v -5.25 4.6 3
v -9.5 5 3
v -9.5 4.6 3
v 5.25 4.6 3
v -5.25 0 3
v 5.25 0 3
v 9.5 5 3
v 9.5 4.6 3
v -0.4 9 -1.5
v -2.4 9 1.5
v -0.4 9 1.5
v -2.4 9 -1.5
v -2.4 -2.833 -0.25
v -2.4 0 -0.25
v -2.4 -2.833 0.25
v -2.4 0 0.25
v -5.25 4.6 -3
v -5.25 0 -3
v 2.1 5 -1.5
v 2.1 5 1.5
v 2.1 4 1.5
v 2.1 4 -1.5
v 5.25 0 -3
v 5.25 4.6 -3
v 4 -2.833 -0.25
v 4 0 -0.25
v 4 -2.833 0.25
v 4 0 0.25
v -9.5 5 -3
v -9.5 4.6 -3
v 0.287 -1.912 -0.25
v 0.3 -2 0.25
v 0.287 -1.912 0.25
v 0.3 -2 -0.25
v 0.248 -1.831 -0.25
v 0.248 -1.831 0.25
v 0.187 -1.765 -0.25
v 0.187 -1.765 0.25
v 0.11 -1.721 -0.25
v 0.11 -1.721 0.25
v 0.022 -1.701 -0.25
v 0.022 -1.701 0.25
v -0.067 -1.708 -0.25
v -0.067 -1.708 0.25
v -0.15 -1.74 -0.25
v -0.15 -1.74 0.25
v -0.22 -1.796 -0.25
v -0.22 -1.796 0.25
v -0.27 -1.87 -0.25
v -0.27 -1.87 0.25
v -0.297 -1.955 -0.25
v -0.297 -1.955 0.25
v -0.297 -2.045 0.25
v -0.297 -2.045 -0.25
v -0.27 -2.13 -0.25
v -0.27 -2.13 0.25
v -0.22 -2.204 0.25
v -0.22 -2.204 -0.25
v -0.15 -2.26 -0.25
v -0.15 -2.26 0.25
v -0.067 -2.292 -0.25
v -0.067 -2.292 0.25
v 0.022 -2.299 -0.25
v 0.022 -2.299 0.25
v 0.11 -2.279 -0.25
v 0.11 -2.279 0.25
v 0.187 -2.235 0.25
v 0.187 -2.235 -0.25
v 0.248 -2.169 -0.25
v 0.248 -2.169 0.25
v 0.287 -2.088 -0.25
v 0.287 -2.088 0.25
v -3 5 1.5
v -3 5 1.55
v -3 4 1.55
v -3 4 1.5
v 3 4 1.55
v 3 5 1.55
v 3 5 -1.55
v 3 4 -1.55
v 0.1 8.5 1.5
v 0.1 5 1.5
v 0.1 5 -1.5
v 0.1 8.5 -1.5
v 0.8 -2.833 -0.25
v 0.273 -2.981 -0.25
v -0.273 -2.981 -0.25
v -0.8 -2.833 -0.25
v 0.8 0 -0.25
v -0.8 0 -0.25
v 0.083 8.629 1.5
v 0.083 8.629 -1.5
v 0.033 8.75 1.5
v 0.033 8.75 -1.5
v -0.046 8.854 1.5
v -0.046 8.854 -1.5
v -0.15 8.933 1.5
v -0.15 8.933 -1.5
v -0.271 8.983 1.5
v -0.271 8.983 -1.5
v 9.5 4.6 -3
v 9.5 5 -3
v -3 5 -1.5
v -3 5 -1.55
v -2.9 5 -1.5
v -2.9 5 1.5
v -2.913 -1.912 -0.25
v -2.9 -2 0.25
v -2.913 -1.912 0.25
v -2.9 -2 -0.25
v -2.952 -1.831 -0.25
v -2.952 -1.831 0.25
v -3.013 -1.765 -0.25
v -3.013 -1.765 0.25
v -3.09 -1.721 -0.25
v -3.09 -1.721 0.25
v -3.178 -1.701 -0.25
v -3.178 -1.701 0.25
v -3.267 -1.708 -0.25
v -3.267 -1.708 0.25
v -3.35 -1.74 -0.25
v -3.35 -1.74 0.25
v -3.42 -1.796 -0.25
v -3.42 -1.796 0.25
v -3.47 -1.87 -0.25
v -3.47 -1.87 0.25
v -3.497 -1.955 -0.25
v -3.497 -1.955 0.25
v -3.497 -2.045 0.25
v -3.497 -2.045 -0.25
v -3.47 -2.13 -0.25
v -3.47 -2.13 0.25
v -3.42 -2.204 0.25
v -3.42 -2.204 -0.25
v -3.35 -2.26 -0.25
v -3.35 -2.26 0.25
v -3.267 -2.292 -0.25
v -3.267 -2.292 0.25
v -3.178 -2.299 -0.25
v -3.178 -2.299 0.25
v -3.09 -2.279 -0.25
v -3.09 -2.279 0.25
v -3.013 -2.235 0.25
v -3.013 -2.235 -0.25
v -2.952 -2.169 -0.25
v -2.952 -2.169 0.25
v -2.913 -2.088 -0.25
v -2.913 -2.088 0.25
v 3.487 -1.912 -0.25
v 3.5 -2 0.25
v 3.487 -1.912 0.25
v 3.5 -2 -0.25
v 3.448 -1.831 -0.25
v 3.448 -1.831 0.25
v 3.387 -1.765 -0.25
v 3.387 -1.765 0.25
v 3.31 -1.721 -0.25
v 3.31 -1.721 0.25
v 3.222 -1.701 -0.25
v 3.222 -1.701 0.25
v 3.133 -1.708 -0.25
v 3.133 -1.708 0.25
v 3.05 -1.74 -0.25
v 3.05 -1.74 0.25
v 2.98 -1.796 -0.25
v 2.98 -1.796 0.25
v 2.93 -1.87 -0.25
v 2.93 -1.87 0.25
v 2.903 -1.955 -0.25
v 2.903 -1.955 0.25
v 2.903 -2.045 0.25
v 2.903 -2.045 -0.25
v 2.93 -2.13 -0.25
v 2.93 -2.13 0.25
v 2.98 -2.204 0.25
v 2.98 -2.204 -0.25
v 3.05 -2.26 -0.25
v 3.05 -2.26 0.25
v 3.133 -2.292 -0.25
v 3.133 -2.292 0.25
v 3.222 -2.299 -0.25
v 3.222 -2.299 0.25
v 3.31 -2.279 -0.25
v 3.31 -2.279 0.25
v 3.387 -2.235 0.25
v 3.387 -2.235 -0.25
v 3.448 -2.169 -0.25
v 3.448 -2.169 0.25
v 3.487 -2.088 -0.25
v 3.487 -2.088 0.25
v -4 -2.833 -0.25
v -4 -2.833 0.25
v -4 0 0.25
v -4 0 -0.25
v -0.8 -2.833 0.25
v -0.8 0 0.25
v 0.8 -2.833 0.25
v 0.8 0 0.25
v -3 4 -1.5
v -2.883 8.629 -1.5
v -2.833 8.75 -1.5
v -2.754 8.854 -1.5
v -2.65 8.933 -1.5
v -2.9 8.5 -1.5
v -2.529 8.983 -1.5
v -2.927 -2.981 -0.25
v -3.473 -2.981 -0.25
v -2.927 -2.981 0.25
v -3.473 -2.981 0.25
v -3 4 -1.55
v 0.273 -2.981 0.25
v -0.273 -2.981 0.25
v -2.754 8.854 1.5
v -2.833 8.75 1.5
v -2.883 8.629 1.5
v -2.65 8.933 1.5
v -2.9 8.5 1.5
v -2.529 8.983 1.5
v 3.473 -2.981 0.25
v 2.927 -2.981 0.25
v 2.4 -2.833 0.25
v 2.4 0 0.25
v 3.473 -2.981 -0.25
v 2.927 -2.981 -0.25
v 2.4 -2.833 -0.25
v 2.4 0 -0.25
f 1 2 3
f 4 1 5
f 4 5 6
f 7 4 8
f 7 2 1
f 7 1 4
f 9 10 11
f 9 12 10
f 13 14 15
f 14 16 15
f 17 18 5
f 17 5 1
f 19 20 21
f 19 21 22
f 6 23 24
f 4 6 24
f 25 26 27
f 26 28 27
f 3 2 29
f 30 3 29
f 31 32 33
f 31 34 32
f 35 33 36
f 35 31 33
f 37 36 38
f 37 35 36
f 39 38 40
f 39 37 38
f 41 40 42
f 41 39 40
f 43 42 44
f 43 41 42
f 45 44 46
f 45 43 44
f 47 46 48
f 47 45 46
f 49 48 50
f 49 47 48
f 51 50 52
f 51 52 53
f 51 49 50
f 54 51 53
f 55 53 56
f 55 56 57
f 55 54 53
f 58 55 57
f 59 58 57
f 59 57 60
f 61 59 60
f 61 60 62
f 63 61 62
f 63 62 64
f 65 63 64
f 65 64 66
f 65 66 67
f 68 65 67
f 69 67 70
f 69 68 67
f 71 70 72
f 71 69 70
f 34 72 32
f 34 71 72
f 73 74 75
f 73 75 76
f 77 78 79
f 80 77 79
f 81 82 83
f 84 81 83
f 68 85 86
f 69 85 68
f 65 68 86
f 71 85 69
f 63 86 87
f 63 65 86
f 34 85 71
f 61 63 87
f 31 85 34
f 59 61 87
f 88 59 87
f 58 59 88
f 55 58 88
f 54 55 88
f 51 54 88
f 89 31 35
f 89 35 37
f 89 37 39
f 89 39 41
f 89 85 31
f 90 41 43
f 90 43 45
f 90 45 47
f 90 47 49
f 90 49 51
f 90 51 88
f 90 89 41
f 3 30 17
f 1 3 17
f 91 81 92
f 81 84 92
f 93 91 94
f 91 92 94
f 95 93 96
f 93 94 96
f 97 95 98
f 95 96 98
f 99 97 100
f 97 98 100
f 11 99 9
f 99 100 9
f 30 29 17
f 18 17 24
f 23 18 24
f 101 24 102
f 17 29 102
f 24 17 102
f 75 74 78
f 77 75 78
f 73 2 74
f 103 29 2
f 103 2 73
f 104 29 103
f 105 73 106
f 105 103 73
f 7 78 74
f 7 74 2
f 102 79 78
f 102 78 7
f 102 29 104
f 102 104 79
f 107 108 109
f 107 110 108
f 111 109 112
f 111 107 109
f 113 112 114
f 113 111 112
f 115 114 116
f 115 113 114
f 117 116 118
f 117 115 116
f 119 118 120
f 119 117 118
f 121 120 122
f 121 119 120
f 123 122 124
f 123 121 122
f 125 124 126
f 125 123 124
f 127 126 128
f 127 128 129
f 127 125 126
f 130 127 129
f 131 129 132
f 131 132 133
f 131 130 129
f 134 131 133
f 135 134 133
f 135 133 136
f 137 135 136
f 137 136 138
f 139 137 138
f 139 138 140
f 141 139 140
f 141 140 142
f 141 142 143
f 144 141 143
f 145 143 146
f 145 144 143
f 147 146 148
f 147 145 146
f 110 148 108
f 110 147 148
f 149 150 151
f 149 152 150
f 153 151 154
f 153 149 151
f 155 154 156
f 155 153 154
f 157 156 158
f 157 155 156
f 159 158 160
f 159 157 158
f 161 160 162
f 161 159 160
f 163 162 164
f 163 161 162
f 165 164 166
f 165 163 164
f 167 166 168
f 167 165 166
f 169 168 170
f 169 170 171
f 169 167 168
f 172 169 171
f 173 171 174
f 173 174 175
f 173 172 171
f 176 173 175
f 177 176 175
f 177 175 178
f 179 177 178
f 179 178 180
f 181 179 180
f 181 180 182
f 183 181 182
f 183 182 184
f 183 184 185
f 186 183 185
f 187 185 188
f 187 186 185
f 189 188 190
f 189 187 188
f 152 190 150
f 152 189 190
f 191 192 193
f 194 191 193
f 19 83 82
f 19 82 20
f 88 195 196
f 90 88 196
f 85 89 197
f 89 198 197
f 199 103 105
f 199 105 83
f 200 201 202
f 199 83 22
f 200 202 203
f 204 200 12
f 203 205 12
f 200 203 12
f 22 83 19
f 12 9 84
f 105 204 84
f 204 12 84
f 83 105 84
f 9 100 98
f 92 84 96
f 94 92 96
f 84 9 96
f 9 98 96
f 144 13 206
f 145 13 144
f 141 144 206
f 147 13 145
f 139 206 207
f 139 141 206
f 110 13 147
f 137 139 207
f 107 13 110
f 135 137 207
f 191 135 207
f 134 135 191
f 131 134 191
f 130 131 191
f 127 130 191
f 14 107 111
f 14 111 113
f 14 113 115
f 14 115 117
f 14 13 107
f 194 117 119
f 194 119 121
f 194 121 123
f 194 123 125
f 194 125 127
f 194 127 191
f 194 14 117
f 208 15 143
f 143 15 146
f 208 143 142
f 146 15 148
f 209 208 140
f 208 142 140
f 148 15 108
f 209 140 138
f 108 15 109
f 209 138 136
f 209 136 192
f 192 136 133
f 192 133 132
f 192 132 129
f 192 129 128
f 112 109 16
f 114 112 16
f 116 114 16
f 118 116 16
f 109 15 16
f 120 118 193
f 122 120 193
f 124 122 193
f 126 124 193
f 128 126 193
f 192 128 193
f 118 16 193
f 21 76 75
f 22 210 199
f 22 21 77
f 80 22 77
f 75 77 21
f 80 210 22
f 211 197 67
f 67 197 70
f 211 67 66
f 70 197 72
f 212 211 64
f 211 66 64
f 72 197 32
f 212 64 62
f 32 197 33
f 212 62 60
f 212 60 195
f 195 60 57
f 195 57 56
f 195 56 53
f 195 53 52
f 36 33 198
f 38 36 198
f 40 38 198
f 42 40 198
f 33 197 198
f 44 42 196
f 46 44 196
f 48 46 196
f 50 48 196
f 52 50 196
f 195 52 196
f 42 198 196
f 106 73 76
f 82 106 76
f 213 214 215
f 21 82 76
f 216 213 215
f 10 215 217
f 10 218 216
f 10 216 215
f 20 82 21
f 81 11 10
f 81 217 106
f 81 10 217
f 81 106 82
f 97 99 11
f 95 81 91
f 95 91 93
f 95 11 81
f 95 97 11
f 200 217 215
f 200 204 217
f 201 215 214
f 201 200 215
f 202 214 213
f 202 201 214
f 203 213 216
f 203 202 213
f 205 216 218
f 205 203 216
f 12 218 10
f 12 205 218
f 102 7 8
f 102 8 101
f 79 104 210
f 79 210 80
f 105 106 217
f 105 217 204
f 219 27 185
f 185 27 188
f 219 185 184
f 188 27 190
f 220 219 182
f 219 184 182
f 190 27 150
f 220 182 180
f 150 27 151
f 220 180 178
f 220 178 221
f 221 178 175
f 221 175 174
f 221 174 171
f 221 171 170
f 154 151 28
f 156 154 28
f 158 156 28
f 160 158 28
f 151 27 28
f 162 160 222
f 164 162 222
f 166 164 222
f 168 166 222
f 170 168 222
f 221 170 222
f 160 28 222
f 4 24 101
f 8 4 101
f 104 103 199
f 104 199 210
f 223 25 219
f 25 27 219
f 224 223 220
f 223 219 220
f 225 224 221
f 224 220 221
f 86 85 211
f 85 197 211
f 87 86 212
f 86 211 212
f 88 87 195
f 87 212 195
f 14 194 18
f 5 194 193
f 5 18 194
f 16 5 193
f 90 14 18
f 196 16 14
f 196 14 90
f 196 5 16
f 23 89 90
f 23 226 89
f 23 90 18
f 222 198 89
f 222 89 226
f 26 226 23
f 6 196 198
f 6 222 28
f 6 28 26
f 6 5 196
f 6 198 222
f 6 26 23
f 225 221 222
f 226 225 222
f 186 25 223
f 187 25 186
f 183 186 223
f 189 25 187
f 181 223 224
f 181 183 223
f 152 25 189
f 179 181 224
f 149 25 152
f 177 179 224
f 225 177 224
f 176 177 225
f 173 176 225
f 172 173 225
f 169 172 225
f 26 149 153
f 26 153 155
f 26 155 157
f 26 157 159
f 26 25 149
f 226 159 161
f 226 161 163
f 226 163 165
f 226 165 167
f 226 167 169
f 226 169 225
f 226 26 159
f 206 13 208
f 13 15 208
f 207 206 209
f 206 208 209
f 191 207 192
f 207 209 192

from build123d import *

# Parameters (mm, degrees)
SKETCH1_W                     = 10.5
SKETCH1_H                     = 5
BASE_DEPTH                    = 3
SKETCH2_W                     = 19
SKETCH2_H                     = 6
FLANGE_DEPTH                  = 0.4
SKETCH3_W                     = 6
SKETCH3_H                     = 3.1
SWITCH_ENCOMPASSING_CUT_DEPTH = 1
SKETCH4_W                     = 3
SKETCH4_H                     = 3
SWITCH_DEPTH                  = 5
SKETCH7_W                     = 7
SKETCH7_H                     = 3
SWITCH_BASE_DEPTH             = 1
SKETCH6_R                     = 0.3
LEG_DEPTH                     = 0.25
L_LEFT_COUNT                  = 2
L_LEFT_PITCH                  = 3.2
L_RIGHT_COUNT                 = 2
L_RIGHT_PITCH                 = 3.2
S_F_R                         = 0.5


with BuildPart() as part:
    # Sketch1 → BASE (new, symmetric)
    with BuildSketch(Plane.XY):
        with Locations((0, 2.5)):
            Rectangle(SKETCH1_W, SKETCH1_H)
    extrude(amount=BASE_DEPTH, both=True)

    # Sketch2 → FLANGE (add)
    with BuildSketch(Plane(origin=(0, 5, 0), x_dir=(1, 0, 0), z_dir=(0, 1, 0))):
        Rectangle(SKETCH2_W, SKETCH2_H)
    extrude(amount=-FLANGE_DEPTH)

    # Sketch3 → SWITCH ENCOMPASSING CUT (cut)
    with BuildSketch(Plane(origin=(0, 5, 0), x_dir=(1, 0, 0), z_dir=(0, 1, 0))):
        Rectangle(SKETCH3_W, SKETCH3_H)
    extrude(amount=-SWITCH_ENCOMPASSING_CUT_DEPTH, mode=Mode.SUBTRACT)

    # Sketch4 → SWITCH (add)
    with BuildSketch(Plane(origin=(0, 4, 0), x_dir=(1, 0, 0), z_dir=(0, 1, 0))):
        with Locations((-1.4, 0)):
            Rectangle(SKETCH4_W, SKETCH4_H)
    extrude(amount=SWITCH_DEPTH)

    # Sketch7 → SWITCH BASE (add)
    with BuildSketch(Plane(origin=(0, 5, 0), x_dir=(1, 0, 0), z_dir=(0, 1, 0))):
        with Locations((-1.4, 0)):
            Rectangle(SKETCH7_W, SKETCH7_H)
    extrude(amount=-SWITCH_BASE_DEPTH)

    # Sketch6 → LEG (add, symmetric)
    with BuildSketch(Plane.XY):
        with BuildLine():
            Line((-0.8, 0), (0.8, 0))
            Line((0.8, 0), (0.8, -2.833030278))
            ThreePointArc((0.8, -2.833030278), (0, -3), (-0.8, -2.833030278))
            Line((-0.8, -2.833030278), (-0.8, 0))
        make_face()
        with Locations((0, -2)):
            Circle(SKETCH6_R, mode=Mode.SUBTRACT)
    leg = extrude(amount=LEG_DEPTH, both=True)

    # L LEFT: LEG ×2
    with Locations(*[(i * L_LEFT_PITCH, 0, 0) for i in range(1, L_LEFT_COUNT)]):
        add(leg)

    # L RIGHT: LEG ×2
    with Locations(*[(-i * L_RIGHT_PITCH, 0, 0) for i in range(1, L_RIGHT_COUNT)]):
        add(leg)

    # S F
    s_f_edges = [part.edges().sort_by_distance(p)[0] for p in [
        (-2.9, 9, 0),
        (0.1, 9, 0),
    ]]
    fillet(s_f_edges, radius=S_F_R)


solid = part.part
